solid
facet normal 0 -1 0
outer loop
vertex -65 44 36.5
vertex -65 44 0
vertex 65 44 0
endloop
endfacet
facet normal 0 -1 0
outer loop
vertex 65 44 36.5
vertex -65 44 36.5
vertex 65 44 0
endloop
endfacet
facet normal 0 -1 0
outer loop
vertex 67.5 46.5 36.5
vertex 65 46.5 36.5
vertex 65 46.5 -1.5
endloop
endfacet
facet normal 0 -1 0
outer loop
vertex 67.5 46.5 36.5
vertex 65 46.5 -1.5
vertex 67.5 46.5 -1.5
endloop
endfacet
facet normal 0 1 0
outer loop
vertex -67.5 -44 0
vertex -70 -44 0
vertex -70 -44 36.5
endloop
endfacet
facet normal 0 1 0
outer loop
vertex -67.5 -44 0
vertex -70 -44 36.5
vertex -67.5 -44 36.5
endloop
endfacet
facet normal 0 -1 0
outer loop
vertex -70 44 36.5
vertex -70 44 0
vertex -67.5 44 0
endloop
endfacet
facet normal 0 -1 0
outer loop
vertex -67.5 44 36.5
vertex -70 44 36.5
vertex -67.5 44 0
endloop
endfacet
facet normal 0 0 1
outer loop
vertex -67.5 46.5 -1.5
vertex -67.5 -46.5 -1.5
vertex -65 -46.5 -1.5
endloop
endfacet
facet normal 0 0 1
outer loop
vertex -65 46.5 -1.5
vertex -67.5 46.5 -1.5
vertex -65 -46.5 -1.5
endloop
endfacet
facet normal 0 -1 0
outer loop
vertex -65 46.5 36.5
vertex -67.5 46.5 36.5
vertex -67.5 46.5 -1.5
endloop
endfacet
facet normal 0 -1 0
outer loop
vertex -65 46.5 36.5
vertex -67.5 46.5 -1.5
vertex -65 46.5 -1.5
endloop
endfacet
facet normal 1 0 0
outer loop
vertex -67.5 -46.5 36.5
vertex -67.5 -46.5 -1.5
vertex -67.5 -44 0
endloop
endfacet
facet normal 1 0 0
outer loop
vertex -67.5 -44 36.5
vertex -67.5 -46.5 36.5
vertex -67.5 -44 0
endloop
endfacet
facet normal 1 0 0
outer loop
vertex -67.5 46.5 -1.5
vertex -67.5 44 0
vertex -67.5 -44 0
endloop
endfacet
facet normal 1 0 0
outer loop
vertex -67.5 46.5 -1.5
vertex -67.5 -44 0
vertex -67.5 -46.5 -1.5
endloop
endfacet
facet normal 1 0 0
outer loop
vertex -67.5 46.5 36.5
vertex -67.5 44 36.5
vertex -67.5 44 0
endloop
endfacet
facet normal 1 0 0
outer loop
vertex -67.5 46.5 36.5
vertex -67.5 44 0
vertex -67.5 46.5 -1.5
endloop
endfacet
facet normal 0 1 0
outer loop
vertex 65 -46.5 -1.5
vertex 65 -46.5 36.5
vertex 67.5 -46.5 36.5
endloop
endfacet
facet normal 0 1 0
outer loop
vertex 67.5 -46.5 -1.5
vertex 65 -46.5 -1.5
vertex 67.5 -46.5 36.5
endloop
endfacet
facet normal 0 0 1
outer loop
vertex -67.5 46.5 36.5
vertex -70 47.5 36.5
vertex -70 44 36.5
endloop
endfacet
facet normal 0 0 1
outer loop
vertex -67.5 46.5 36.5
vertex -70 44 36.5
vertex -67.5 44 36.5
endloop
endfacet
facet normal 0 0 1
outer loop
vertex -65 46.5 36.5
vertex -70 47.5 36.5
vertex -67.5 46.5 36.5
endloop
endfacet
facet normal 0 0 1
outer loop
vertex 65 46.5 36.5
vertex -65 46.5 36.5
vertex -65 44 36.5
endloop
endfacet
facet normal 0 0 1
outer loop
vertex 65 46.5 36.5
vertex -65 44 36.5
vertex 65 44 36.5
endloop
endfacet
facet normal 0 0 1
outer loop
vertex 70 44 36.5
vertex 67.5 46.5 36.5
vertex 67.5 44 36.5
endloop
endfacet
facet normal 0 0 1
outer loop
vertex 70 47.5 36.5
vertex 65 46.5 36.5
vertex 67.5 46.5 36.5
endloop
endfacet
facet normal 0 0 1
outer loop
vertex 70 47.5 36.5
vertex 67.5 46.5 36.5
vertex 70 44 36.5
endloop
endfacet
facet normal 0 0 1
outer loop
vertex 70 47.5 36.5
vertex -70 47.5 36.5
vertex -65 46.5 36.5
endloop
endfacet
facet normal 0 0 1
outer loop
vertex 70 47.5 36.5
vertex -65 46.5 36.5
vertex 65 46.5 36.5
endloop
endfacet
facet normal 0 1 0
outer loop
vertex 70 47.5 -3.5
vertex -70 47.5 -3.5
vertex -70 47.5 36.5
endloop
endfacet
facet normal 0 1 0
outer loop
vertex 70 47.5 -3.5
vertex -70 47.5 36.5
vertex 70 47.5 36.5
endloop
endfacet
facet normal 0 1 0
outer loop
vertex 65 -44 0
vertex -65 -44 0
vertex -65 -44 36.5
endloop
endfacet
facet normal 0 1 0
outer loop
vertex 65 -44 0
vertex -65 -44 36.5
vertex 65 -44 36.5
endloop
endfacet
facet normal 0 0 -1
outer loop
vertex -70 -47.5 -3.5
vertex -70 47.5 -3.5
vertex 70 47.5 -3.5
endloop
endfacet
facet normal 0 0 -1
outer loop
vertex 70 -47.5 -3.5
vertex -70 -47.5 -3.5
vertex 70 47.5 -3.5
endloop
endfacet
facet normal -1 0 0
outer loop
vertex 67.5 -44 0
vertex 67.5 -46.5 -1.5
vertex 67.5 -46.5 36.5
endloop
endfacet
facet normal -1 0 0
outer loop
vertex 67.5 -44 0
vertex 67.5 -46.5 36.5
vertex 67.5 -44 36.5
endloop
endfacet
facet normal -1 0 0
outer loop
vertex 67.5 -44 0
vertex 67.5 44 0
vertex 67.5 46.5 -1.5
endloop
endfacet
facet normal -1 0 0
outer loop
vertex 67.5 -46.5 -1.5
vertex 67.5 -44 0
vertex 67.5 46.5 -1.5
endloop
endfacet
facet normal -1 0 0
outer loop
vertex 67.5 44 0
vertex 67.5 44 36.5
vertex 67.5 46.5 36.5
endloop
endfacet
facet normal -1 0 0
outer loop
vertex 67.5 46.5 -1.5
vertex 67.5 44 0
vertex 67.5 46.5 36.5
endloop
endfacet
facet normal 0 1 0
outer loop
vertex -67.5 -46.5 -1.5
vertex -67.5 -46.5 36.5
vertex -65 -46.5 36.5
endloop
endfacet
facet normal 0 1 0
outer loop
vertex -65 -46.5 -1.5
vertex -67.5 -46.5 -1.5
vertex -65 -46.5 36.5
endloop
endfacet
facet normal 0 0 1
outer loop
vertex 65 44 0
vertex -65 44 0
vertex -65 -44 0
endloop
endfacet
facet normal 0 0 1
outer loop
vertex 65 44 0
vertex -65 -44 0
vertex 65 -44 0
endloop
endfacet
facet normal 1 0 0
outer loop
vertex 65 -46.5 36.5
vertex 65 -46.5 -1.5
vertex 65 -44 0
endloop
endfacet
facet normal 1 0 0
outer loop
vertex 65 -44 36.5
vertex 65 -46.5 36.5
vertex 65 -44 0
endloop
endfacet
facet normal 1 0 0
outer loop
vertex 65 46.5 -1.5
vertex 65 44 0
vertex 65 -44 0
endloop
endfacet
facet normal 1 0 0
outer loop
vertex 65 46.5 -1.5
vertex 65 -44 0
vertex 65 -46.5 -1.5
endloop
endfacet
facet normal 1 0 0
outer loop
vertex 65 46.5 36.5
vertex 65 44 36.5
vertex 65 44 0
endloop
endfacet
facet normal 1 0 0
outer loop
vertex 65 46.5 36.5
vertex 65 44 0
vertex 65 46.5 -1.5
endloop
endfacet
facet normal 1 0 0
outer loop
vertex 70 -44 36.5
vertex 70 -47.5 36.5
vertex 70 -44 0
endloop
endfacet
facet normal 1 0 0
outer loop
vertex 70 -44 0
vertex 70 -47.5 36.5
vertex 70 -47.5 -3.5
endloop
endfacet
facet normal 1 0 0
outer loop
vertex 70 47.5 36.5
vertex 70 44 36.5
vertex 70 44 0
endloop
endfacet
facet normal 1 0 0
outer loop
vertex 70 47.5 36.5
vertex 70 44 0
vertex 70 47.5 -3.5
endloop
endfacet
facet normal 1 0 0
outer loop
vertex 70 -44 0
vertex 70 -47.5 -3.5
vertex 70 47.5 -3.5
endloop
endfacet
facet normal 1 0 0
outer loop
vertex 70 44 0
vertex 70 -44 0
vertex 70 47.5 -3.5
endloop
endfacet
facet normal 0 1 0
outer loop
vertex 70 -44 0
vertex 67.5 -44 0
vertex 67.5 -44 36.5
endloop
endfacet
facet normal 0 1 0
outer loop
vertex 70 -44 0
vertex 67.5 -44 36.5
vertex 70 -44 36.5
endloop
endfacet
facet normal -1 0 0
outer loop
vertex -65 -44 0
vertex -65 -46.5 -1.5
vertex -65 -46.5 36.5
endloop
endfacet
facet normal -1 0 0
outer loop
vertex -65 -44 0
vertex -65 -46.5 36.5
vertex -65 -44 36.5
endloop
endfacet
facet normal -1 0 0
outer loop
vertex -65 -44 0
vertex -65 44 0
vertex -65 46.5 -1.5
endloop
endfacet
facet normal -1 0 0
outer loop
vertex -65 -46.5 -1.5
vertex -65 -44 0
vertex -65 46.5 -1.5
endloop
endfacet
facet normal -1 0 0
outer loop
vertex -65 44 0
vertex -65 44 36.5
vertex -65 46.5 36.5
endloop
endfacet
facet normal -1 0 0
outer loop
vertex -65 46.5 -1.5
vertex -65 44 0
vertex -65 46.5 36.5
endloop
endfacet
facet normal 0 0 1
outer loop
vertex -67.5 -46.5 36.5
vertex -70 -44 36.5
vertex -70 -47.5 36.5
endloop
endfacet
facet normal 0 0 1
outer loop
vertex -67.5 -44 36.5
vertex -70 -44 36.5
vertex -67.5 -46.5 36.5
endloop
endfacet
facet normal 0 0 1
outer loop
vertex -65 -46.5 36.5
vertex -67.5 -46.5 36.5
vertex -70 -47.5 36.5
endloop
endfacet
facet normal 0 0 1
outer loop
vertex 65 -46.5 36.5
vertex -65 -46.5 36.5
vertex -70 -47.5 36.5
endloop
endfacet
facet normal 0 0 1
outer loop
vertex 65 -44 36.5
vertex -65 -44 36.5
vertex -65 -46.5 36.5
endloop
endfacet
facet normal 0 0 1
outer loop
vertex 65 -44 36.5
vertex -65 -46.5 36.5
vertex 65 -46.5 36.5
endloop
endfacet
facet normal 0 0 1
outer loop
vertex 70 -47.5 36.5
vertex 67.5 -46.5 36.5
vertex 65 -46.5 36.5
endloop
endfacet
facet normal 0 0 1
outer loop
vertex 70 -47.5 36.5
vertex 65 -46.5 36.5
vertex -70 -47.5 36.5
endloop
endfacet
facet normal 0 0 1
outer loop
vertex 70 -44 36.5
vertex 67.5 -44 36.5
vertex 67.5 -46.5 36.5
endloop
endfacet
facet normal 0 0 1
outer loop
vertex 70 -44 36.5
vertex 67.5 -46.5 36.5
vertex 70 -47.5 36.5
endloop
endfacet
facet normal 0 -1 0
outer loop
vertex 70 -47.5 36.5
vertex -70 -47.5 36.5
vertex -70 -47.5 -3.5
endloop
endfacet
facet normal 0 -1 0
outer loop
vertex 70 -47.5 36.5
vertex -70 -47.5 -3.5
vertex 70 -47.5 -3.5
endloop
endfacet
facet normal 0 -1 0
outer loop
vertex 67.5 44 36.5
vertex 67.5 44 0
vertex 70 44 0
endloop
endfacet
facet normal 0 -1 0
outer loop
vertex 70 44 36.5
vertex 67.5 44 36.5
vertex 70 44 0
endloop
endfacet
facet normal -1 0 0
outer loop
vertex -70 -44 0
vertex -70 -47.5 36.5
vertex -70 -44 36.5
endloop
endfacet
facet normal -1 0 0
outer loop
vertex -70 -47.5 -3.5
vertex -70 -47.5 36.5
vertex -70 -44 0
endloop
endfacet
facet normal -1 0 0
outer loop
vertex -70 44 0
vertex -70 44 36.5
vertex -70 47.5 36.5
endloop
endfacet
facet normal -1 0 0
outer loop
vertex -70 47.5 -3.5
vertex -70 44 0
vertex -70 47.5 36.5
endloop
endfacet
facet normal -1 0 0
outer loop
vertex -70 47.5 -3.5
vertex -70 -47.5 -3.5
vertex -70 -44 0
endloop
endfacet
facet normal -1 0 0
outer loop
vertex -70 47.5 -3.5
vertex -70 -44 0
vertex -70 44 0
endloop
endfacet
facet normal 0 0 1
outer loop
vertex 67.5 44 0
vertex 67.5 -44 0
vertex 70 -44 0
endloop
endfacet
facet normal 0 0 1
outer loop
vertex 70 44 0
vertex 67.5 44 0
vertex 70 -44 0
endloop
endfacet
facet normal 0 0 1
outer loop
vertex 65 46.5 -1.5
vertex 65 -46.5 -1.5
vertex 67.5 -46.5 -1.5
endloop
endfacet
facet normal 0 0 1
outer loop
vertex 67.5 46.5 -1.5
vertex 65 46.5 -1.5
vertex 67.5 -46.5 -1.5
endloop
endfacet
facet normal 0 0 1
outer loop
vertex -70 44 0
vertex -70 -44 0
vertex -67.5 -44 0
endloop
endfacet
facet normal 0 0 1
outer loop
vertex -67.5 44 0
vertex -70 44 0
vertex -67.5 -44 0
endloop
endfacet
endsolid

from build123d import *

# Parameters (mm, degrees)
SKETCH001_W     = 140
SKETCH001_H     = 95
PAD002_DEPTH    = 3.5
SKETCH006_W     = 140
SKETCH006_H     = 3.5
PAD003_DEPTH    = 36.5
SKETCH007_W     = 2.5
SKETCH007_H     = 93
POCKET001_DEPTH = 38


with BuildPart() as part:
    # Sketch001 → Pad002 (new body)
    with BuildSketch(Plane.XY):
        Rectangle(SKETCH001_W, SKETCH001_H)
    extrude(amount=-PAD002_DEPTH)

    # Sketch006 → Pad003 (join)
    with BuildSketch(Plane.XY):
        with Locations((0, 45.75)):
            Rectangle(SKETCH006_W, SKETCH006_H)
        with Locations((0, -45.75)):
            Rectangle(SKETCH006_W, SKETCH006_H)
    extrude(amount=PAD003_DEPTH)

    # Sketch007 (on Face16 of Pad003) → Pocket001 (cut)
    with BuildSketch(Plane.XY.offset(36.5)):
        with Locations((-66.25, 0)):
            Rectangle(SKETCH007_W, SKETCH007_H)
        with Locations((66.25, 0)):
            Rectangle(SKETCH007_W, SKETCH007_H)
    extrude(amount=-POCKET001_DEPTH, mode=Mode.SUBTRACT)


solid = part.part
